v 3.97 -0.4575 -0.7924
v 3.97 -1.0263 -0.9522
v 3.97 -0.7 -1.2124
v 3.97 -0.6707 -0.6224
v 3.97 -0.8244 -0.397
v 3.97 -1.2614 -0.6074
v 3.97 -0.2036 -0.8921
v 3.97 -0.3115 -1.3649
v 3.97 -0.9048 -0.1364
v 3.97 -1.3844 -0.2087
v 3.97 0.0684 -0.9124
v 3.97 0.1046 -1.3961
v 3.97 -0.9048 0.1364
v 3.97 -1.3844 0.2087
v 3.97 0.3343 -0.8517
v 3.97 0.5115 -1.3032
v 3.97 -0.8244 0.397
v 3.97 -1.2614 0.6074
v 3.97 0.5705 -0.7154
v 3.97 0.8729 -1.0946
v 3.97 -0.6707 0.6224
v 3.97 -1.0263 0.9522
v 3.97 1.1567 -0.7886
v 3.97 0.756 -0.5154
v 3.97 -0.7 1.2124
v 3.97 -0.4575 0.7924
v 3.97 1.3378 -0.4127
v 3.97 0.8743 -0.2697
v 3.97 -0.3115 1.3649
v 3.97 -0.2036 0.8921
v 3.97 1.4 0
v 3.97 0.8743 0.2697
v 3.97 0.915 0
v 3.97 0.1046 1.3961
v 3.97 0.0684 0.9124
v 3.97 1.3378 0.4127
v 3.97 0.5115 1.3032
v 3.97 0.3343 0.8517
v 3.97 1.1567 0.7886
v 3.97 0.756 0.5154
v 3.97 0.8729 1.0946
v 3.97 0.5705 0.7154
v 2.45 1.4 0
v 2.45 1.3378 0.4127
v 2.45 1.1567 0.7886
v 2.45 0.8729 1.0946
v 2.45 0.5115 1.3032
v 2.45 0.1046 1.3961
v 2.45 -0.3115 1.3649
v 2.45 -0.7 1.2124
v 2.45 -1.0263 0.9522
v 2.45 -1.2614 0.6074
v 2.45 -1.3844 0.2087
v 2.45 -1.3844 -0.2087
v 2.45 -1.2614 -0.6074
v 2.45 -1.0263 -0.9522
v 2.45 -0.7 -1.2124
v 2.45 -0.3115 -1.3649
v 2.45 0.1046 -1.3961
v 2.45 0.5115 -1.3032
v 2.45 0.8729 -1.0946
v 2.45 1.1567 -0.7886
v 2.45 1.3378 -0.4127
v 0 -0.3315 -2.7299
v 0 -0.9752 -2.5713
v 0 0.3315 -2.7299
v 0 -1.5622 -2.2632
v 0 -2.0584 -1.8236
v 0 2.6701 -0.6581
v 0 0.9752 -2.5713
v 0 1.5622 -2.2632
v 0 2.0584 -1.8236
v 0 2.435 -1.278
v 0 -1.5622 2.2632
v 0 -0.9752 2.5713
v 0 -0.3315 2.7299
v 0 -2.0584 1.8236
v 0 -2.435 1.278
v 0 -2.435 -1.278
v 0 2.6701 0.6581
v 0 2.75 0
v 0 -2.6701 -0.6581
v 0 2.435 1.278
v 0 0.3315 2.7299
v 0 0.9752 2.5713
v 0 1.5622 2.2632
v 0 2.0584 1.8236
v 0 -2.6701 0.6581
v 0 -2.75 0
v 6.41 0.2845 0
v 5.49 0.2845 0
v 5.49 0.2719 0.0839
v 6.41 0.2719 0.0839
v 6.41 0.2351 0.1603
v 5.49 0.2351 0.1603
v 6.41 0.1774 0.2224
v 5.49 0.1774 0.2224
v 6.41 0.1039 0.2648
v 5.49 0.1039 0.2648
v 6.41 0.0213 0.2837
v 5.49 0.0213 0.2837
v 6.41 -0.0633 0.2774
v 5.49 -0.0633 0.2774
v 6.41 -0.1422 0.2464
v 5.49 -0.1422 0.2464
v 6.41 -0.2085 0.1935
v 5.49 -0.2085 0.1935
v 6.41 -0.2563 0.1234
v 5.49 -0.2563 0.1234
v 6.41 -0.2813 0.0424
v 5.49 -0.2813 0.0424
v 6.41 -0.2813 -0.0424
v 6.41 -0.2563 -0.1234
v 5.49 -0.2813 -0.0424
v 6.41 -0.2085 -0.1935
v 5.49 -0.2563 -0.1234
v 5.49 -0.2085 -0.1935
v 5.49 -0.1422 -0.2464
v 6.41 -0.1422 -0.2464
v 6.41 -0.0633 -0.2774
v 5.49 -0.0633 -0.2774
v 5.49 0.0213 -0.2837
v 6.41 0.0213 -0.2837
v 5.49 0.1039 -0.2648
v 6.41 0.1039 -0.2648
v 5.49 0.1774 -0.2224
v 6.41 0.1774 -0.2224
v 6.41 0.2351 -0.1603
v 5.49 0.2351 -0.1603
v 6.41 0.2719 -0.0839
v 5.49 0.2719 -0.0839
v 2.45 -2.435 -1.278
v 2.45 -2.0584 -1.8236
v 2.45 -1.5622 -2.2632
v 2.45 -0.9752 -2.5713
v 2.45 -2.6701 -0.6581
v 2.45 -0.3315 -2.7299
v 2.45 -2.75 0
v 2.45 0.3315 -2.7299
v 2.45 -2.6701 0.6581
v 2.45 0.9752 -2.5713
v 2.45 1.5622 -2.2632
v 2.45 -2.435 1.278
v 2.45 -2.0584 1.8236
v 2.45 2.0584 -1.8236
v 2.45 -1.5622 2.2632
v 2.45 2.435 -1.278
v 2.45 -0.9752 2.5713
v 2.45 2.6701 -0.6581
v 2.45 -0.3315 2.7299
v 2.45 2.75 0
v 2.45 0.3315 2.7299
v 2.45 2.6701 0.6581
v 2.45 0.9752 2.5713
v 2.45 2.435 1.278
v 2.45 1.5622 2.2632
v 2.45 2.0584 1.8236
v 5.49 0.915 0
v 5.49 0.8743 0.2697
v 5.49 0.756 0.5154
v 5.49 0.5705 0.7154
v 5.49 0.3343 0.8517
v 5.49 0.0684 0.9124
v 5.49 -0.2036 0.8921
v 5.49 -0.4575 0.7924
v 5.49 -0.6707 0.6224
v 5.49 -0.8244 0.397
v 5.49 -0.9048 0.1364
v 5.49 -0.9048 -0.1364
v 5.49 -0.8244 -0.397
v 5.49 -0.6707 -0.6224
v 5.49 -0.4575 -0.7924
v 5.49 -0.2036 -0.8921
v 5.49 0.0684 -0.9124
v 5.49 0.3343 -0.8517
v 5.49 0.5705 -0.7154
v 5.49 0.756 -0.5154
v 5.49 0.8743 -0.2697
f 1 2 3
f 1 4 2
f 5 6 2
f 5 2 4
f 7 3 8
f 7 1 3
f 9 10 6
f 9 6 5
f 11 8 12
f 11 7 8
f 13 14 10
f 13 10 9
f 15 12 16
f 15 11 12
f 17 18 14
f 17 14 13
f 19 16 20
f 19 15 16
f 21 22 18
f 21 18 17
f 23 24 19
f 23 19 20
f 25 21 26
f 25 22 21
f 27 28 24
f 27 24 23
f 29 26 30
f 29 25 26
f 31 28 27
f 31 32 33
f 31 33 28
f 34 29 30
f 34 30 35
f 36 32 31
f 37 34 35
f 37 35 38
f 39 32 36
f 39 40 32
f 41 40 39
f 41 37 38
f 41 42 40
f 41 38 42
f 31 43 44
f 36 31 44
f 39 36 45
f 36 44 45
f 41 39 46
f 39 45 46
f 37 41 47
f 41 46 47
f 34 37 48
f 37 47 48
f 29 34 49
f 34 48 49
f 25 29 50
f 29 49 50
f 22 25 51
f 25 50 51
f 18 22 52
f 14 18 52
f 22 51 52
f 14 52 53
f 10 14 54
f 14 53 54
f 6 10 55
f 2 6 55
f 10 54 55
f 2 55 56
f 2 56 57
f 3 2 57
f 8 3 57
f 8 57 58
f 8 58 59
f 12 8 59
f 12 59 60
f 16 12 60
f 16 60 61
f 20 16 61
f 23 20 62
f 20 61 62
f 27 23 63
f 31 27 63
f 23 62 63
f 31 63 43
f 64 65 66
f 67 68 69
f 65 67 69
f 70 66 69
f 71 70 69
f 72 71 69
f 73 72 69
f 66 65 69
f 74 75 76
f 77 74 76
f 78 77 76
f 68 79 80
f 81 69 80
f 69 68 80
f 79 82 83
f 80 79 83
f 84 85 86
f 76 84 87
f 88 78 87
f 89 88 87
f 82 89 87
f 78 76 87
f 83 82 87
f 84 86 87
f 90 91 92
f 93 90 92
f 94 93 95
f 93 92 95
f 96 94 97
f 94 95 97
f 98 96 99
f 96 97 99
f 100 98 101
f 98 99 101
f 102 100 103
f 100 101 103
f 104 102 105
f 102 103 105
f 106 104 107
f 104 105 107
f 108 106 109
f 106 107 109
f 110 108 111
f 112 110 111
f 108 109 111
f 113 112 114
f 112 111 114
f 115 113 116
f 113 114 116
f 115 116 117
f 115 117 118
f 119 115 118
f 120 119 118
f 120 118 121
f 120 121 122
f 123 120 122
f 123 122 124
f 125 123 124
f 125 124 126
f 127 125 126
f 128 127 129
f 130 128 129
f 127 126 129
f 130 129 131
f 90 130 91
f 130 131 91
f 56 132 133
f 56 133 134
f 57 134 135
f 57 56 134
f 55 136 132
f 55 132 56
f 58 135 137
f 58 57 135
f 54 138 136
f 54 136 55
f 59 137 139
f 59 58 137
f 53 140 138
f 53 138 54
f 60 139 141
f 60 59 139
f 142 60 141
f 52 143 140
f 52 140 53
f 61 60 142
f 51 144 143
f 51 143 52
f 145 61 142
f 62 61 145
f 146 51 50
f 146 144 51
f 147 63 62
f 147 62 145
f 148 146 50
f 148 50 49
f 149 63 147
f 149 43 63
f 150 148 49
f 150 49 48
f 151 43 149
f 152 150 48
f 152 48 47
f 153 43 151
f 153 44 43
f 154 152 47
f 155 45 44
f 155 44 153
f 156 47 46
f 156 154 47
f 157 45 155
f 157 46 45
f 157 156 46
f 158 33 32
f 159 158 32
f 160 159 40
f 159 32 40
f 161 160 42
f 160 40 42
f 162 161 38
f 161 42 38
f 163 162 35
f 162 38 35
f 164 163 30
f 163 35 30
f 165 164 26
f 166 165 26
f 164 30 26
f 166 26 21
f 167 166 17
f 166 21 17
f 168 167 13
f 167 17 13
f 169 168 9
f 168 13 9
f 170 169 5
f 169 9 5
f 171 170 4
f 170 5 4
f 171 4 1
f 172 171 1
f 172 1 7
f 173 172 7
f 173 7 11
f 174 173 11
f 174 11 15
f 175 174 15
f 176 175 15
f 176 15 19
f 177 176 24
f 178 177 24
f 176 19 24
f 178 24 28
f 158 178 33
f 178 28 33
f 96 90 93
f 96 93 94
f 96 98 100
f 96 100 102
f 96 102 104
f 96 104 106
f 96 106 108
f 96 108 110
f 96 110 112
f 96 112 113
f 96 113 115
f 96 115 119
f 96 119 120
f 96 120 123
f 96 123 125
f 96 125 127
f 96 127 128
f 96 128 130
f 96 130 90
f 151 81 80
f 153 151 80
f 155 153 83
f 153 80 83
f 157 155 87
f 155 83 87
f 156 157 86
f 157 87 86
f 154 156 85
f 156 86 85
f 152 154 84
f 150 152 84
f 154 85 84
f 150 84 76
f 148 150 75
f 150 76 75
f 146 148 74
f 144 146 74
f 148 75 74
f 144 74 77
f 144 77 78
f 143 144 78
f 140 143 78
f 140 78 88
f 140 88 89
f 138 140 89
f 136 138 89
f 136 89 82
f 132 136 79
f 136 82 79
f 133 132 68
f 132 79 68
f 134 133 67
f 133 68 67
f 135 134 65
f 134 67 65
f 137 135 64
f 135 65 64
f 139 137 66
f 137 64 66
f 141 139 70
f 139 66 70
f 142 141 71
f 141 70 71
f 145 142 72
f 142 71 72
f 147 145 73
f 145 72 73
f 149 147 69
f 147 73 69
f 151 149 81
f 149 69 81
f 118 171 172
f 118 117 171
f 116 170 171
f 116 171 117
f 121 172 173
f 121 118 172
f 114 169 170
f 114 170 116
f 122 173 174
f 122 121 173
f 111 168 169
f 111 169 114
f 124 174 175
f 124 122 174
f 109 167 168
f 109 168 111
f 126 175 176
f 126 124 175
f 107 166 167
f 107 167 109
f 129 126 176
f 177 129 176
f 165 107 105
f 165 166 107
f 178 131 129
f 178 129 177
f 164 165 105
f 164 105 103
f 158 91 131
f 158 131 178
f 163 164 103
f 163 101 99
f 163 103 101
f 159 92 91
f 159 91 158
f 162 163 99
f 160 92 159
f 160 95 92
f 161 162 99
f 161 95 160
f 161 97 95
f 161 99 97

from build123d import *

# Parameters (mm, degrees)
F0_R     = 2.75
F1_DEPTH = 2.45
F2_R     = 1.4
F3_DEPTH = 1.52
F4_R     = 0.915
F5_DEPTH = 1.52
F6_R     = 0.284492
F7_DEPTH = 0.92


with BuildPart() as f1:
    # F0 (on Right) → F1 (new body)
    with BuildSketch(Plane.YZ):
        Circle(F0_R)
    extrude(amount=F1_DEPTH)

    # F2 (on face) → F3 (join)
    with BuildSketch(Plane.YZ.offset(2.45)):
        Circle(F2_R)
    extrude(amount=F3_DEPTH)

    # F4 (on face) → F5 (join)
    with BuildSketch(Plane.YZ.offset(3.97)):
        Circle(F4_R)
    extrude(amount=F5_DEPTH)

    # F6 (on face) → F7 (join)
    with BuildSketch(Plane.YZ.offset(5.49)):
        Circle(F6_R)
    extrude(amount=F7_DEPTH)


solid = f1.part
